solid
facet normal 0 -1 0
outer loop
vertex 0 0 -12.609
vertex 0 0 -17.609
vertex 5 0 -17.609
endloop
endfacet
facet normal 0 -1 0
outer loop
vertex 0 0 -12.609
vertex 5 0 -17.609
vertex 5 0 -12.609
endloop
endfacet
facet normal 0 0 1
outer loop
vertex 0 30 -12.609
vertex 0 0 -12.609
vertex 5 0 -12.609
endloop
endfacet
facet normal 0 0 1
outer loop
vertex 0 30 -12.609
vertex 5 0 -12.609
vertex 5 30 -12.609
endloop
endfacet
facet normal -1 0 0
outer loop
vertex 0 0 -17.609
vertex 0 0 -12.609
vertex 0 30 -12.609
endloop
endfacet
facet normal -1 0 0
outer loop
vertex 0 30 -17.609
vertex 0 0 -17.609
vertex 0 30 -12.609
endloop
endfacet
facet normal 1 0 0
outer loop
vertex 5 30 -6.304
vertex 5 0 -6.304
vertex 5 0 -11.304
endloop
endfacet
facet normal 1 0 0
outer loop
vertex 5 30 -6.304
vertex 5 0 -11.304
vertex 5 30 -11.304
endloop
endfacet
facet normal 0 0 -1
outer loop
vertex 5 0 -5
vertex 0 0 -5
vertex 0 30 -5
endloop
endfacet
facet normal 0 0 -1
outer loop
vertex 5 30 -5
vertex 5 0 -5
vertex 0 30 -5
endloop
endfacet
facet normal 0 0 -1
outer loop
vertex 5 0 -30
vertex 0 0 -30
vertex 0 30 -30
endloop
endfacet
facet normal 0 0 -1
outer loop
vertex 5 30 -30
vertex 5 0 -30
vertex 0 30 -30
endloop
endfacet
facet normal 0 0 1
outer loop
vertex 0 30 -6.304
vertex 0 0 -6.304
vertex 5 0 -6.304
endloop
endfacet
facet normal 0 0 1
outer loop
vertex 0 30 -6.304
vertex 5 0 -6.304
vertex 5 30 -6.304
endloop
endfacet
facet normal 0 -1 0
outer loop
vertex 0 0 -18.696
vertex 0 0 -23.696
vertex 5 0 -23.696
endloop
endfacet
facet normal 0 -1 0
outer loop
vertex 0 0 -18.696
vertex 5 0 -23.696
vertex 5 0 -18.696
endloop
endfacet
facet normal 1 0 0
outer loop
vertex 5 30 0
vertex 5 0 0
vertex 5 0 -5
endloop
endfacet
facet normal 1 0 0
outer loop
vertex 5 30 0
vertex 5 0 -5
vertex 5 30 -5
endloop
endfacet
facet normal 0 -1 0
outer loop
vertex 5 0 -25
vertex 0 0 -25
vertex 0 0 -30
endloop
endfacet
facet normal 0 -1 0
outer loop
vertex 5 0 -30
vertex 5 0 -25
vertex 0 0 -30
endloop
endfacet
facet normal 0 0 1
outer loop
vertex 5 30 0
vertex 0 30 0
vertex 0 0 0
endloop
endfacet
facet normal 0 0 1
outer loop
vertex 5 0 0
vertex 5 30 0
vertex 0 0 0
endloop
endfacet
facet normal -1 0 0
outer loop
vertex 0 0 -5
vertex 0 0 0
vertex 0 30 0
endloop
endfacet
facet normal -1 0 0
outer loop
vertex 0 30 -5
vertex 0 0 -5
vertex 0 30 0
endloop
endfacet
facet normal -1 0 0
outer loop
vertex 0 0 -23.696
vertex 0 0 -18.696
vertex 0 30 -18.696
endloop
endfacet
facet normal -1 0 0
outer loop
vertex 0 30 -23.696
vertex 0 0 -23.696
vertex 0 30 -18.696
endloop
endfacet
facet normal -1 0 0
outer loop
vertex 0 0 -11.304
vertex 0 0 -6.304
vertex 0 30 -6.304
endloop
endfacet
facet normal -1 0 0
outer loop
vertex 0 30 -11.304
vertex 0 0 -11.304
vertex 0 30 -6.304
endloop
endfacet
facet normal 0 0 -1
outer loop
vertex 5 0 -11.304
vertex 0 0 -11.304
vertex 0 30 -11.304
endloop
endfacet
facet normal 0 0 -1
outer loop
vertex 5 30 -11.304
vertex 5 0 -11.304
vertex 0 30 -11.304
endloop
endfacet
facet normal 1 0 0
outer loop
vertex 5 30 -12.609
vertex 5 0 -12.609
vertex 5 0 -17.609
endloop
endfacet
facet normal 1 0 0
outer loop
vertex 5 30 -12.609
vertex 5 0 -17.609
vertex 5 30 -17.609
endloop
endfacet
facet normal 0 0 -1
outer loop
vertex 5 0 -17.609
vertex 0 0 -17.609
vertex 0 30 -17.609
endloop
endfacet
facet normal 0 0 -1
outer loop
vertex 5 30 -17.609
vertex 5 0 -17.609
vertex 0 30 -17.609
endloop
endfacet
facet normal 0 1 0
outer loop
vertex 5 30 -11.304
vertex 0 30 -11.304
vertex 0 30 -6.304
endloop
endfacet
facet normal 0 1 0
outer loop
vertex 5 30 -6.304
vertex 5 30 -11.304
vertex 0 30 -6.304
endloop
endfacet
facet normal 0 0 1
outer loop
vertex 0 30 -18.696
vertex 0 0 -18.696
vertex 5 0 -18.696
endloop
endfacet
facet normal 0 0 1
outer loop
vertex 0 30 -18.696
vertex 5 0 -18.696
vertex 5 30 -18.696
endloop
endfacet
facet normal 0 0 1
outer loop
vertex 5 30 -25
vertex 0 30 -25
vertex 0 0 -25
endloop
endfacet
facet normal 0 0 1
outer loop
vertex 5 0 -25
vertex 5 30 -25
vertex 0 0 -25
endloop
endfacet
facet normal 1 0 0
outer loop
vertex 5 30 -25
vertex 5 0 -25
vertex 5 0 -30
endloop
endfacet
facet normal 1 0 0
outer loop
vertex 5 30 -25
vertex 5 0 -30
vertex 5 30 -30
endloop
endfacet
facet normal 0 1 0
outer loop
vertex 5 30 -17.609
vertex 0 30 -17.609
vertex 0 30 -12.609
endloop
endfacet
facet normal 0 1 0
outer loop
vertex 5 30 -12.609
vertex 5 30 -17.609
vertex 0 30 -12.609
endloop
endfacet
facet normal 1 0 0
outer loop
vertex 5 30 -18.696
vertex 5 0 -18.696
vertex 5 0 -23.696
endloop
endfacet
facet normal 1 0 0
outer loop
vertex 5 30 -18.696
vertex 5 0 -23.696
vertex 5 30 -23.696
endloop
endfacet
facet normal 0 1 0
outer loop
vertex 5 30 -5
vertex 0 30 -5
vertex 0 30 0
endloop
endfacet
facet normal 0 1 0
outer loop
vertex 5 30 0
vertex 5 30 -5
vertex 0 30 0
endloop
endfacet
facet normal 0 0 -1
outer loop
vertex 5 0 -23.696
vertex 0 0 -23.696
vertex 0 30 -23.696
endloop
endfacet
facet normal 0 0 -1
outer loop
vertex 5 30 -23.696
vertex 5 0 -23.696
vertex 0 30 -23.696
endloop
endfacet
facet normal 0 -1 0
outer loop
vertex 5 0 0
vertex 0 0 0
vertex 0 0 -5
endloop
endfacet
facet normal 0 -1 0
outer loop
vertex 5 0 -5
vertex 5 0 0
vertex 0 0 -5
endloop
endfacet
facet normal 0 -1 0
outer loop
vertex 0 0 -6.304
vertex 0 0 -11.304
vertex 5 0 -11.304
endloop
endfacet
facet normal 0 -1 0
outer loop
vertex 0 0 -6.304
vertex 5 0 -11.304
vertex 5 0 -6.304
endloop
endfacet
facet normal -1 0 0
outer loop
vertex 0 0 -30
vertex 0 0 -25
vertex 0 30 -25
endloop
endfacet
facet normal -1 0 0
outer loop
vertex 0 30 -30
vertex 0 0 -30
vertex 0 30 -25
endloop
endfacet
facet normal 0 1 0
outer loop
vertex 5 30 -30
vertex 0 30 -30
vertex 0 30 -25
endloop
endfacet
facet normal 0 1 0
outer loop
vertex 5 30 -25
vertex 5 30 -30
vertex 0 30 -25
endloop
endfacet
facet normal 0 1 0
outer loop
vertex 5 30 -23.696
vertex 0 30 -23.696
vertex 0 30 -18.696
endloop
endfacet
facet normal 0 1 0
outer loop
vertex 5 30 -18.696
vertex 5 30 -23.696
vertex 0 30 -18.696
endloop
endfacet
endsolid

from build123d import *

# Parameters (mm, degrees)
F1_DEPTH = 5
F0_W     = 30
F0_H     = 5.0000004371
F0_H_2   = 5


# Not quite as in the source:
# - ends of sketch curves that miss each other by under 0.0002 mm in the source are joined


with BuildPart() as f1:
    # F0 (on Right) → F1 (new body)
    with BuildSketch(Plane.YZ):
        Polygon((0, -25.0000003725), (0, -30), (12, -30), (12.39, -30), (12.4011761725, -30), (17.61, -30), (30, -30), (30, -25.0000003725), align=None)
    extrude(amount=F1_DEPTH)


with BuildPart() as f1b:
    # F0 (on Right) → F1, piece 2 (new body)
    with BuildSketch(Plane.YZ):
        with Locations((15, -21.195660154)):
            Rectangle(F0_W, F0_H)
    extrude(amount=F1_DEPTH)


with BuildPart() as f1c:
    # F0 (on Right) → F1, piece 3 (new body)
    with BuildSketch(Plane.YZ):
        with Locations((15, -15.10868)):
            Rectangle(F0_W, F0_H_2)
    extrude(amount=F1_DEPTH)


with BuildPart() as f1d:
    # F0 (on Right) → F1, piece 4 (new body)
    with BuildSketch(Plane.YZ):
        with Locations((15, -8.80434)):
            Rectangle(F0_W, F0_H_2)
    extrude(amount=F1_DEPTH)


with BuildPart() as f1e:
    # F0 (on Right) → F1, piece 5 (new body)
    with BuildSketch(Plane.YZ):
        Polygon((6.5217, 0), (0, 0), (0, -5), (30, -5), (30, 0), (23.4783, 0), align=None)
    extrude(amount=F1_DEPTH)


solid = Compound([f1.part, f1b.part, f1c.part, f1d.part, f1e.part])
